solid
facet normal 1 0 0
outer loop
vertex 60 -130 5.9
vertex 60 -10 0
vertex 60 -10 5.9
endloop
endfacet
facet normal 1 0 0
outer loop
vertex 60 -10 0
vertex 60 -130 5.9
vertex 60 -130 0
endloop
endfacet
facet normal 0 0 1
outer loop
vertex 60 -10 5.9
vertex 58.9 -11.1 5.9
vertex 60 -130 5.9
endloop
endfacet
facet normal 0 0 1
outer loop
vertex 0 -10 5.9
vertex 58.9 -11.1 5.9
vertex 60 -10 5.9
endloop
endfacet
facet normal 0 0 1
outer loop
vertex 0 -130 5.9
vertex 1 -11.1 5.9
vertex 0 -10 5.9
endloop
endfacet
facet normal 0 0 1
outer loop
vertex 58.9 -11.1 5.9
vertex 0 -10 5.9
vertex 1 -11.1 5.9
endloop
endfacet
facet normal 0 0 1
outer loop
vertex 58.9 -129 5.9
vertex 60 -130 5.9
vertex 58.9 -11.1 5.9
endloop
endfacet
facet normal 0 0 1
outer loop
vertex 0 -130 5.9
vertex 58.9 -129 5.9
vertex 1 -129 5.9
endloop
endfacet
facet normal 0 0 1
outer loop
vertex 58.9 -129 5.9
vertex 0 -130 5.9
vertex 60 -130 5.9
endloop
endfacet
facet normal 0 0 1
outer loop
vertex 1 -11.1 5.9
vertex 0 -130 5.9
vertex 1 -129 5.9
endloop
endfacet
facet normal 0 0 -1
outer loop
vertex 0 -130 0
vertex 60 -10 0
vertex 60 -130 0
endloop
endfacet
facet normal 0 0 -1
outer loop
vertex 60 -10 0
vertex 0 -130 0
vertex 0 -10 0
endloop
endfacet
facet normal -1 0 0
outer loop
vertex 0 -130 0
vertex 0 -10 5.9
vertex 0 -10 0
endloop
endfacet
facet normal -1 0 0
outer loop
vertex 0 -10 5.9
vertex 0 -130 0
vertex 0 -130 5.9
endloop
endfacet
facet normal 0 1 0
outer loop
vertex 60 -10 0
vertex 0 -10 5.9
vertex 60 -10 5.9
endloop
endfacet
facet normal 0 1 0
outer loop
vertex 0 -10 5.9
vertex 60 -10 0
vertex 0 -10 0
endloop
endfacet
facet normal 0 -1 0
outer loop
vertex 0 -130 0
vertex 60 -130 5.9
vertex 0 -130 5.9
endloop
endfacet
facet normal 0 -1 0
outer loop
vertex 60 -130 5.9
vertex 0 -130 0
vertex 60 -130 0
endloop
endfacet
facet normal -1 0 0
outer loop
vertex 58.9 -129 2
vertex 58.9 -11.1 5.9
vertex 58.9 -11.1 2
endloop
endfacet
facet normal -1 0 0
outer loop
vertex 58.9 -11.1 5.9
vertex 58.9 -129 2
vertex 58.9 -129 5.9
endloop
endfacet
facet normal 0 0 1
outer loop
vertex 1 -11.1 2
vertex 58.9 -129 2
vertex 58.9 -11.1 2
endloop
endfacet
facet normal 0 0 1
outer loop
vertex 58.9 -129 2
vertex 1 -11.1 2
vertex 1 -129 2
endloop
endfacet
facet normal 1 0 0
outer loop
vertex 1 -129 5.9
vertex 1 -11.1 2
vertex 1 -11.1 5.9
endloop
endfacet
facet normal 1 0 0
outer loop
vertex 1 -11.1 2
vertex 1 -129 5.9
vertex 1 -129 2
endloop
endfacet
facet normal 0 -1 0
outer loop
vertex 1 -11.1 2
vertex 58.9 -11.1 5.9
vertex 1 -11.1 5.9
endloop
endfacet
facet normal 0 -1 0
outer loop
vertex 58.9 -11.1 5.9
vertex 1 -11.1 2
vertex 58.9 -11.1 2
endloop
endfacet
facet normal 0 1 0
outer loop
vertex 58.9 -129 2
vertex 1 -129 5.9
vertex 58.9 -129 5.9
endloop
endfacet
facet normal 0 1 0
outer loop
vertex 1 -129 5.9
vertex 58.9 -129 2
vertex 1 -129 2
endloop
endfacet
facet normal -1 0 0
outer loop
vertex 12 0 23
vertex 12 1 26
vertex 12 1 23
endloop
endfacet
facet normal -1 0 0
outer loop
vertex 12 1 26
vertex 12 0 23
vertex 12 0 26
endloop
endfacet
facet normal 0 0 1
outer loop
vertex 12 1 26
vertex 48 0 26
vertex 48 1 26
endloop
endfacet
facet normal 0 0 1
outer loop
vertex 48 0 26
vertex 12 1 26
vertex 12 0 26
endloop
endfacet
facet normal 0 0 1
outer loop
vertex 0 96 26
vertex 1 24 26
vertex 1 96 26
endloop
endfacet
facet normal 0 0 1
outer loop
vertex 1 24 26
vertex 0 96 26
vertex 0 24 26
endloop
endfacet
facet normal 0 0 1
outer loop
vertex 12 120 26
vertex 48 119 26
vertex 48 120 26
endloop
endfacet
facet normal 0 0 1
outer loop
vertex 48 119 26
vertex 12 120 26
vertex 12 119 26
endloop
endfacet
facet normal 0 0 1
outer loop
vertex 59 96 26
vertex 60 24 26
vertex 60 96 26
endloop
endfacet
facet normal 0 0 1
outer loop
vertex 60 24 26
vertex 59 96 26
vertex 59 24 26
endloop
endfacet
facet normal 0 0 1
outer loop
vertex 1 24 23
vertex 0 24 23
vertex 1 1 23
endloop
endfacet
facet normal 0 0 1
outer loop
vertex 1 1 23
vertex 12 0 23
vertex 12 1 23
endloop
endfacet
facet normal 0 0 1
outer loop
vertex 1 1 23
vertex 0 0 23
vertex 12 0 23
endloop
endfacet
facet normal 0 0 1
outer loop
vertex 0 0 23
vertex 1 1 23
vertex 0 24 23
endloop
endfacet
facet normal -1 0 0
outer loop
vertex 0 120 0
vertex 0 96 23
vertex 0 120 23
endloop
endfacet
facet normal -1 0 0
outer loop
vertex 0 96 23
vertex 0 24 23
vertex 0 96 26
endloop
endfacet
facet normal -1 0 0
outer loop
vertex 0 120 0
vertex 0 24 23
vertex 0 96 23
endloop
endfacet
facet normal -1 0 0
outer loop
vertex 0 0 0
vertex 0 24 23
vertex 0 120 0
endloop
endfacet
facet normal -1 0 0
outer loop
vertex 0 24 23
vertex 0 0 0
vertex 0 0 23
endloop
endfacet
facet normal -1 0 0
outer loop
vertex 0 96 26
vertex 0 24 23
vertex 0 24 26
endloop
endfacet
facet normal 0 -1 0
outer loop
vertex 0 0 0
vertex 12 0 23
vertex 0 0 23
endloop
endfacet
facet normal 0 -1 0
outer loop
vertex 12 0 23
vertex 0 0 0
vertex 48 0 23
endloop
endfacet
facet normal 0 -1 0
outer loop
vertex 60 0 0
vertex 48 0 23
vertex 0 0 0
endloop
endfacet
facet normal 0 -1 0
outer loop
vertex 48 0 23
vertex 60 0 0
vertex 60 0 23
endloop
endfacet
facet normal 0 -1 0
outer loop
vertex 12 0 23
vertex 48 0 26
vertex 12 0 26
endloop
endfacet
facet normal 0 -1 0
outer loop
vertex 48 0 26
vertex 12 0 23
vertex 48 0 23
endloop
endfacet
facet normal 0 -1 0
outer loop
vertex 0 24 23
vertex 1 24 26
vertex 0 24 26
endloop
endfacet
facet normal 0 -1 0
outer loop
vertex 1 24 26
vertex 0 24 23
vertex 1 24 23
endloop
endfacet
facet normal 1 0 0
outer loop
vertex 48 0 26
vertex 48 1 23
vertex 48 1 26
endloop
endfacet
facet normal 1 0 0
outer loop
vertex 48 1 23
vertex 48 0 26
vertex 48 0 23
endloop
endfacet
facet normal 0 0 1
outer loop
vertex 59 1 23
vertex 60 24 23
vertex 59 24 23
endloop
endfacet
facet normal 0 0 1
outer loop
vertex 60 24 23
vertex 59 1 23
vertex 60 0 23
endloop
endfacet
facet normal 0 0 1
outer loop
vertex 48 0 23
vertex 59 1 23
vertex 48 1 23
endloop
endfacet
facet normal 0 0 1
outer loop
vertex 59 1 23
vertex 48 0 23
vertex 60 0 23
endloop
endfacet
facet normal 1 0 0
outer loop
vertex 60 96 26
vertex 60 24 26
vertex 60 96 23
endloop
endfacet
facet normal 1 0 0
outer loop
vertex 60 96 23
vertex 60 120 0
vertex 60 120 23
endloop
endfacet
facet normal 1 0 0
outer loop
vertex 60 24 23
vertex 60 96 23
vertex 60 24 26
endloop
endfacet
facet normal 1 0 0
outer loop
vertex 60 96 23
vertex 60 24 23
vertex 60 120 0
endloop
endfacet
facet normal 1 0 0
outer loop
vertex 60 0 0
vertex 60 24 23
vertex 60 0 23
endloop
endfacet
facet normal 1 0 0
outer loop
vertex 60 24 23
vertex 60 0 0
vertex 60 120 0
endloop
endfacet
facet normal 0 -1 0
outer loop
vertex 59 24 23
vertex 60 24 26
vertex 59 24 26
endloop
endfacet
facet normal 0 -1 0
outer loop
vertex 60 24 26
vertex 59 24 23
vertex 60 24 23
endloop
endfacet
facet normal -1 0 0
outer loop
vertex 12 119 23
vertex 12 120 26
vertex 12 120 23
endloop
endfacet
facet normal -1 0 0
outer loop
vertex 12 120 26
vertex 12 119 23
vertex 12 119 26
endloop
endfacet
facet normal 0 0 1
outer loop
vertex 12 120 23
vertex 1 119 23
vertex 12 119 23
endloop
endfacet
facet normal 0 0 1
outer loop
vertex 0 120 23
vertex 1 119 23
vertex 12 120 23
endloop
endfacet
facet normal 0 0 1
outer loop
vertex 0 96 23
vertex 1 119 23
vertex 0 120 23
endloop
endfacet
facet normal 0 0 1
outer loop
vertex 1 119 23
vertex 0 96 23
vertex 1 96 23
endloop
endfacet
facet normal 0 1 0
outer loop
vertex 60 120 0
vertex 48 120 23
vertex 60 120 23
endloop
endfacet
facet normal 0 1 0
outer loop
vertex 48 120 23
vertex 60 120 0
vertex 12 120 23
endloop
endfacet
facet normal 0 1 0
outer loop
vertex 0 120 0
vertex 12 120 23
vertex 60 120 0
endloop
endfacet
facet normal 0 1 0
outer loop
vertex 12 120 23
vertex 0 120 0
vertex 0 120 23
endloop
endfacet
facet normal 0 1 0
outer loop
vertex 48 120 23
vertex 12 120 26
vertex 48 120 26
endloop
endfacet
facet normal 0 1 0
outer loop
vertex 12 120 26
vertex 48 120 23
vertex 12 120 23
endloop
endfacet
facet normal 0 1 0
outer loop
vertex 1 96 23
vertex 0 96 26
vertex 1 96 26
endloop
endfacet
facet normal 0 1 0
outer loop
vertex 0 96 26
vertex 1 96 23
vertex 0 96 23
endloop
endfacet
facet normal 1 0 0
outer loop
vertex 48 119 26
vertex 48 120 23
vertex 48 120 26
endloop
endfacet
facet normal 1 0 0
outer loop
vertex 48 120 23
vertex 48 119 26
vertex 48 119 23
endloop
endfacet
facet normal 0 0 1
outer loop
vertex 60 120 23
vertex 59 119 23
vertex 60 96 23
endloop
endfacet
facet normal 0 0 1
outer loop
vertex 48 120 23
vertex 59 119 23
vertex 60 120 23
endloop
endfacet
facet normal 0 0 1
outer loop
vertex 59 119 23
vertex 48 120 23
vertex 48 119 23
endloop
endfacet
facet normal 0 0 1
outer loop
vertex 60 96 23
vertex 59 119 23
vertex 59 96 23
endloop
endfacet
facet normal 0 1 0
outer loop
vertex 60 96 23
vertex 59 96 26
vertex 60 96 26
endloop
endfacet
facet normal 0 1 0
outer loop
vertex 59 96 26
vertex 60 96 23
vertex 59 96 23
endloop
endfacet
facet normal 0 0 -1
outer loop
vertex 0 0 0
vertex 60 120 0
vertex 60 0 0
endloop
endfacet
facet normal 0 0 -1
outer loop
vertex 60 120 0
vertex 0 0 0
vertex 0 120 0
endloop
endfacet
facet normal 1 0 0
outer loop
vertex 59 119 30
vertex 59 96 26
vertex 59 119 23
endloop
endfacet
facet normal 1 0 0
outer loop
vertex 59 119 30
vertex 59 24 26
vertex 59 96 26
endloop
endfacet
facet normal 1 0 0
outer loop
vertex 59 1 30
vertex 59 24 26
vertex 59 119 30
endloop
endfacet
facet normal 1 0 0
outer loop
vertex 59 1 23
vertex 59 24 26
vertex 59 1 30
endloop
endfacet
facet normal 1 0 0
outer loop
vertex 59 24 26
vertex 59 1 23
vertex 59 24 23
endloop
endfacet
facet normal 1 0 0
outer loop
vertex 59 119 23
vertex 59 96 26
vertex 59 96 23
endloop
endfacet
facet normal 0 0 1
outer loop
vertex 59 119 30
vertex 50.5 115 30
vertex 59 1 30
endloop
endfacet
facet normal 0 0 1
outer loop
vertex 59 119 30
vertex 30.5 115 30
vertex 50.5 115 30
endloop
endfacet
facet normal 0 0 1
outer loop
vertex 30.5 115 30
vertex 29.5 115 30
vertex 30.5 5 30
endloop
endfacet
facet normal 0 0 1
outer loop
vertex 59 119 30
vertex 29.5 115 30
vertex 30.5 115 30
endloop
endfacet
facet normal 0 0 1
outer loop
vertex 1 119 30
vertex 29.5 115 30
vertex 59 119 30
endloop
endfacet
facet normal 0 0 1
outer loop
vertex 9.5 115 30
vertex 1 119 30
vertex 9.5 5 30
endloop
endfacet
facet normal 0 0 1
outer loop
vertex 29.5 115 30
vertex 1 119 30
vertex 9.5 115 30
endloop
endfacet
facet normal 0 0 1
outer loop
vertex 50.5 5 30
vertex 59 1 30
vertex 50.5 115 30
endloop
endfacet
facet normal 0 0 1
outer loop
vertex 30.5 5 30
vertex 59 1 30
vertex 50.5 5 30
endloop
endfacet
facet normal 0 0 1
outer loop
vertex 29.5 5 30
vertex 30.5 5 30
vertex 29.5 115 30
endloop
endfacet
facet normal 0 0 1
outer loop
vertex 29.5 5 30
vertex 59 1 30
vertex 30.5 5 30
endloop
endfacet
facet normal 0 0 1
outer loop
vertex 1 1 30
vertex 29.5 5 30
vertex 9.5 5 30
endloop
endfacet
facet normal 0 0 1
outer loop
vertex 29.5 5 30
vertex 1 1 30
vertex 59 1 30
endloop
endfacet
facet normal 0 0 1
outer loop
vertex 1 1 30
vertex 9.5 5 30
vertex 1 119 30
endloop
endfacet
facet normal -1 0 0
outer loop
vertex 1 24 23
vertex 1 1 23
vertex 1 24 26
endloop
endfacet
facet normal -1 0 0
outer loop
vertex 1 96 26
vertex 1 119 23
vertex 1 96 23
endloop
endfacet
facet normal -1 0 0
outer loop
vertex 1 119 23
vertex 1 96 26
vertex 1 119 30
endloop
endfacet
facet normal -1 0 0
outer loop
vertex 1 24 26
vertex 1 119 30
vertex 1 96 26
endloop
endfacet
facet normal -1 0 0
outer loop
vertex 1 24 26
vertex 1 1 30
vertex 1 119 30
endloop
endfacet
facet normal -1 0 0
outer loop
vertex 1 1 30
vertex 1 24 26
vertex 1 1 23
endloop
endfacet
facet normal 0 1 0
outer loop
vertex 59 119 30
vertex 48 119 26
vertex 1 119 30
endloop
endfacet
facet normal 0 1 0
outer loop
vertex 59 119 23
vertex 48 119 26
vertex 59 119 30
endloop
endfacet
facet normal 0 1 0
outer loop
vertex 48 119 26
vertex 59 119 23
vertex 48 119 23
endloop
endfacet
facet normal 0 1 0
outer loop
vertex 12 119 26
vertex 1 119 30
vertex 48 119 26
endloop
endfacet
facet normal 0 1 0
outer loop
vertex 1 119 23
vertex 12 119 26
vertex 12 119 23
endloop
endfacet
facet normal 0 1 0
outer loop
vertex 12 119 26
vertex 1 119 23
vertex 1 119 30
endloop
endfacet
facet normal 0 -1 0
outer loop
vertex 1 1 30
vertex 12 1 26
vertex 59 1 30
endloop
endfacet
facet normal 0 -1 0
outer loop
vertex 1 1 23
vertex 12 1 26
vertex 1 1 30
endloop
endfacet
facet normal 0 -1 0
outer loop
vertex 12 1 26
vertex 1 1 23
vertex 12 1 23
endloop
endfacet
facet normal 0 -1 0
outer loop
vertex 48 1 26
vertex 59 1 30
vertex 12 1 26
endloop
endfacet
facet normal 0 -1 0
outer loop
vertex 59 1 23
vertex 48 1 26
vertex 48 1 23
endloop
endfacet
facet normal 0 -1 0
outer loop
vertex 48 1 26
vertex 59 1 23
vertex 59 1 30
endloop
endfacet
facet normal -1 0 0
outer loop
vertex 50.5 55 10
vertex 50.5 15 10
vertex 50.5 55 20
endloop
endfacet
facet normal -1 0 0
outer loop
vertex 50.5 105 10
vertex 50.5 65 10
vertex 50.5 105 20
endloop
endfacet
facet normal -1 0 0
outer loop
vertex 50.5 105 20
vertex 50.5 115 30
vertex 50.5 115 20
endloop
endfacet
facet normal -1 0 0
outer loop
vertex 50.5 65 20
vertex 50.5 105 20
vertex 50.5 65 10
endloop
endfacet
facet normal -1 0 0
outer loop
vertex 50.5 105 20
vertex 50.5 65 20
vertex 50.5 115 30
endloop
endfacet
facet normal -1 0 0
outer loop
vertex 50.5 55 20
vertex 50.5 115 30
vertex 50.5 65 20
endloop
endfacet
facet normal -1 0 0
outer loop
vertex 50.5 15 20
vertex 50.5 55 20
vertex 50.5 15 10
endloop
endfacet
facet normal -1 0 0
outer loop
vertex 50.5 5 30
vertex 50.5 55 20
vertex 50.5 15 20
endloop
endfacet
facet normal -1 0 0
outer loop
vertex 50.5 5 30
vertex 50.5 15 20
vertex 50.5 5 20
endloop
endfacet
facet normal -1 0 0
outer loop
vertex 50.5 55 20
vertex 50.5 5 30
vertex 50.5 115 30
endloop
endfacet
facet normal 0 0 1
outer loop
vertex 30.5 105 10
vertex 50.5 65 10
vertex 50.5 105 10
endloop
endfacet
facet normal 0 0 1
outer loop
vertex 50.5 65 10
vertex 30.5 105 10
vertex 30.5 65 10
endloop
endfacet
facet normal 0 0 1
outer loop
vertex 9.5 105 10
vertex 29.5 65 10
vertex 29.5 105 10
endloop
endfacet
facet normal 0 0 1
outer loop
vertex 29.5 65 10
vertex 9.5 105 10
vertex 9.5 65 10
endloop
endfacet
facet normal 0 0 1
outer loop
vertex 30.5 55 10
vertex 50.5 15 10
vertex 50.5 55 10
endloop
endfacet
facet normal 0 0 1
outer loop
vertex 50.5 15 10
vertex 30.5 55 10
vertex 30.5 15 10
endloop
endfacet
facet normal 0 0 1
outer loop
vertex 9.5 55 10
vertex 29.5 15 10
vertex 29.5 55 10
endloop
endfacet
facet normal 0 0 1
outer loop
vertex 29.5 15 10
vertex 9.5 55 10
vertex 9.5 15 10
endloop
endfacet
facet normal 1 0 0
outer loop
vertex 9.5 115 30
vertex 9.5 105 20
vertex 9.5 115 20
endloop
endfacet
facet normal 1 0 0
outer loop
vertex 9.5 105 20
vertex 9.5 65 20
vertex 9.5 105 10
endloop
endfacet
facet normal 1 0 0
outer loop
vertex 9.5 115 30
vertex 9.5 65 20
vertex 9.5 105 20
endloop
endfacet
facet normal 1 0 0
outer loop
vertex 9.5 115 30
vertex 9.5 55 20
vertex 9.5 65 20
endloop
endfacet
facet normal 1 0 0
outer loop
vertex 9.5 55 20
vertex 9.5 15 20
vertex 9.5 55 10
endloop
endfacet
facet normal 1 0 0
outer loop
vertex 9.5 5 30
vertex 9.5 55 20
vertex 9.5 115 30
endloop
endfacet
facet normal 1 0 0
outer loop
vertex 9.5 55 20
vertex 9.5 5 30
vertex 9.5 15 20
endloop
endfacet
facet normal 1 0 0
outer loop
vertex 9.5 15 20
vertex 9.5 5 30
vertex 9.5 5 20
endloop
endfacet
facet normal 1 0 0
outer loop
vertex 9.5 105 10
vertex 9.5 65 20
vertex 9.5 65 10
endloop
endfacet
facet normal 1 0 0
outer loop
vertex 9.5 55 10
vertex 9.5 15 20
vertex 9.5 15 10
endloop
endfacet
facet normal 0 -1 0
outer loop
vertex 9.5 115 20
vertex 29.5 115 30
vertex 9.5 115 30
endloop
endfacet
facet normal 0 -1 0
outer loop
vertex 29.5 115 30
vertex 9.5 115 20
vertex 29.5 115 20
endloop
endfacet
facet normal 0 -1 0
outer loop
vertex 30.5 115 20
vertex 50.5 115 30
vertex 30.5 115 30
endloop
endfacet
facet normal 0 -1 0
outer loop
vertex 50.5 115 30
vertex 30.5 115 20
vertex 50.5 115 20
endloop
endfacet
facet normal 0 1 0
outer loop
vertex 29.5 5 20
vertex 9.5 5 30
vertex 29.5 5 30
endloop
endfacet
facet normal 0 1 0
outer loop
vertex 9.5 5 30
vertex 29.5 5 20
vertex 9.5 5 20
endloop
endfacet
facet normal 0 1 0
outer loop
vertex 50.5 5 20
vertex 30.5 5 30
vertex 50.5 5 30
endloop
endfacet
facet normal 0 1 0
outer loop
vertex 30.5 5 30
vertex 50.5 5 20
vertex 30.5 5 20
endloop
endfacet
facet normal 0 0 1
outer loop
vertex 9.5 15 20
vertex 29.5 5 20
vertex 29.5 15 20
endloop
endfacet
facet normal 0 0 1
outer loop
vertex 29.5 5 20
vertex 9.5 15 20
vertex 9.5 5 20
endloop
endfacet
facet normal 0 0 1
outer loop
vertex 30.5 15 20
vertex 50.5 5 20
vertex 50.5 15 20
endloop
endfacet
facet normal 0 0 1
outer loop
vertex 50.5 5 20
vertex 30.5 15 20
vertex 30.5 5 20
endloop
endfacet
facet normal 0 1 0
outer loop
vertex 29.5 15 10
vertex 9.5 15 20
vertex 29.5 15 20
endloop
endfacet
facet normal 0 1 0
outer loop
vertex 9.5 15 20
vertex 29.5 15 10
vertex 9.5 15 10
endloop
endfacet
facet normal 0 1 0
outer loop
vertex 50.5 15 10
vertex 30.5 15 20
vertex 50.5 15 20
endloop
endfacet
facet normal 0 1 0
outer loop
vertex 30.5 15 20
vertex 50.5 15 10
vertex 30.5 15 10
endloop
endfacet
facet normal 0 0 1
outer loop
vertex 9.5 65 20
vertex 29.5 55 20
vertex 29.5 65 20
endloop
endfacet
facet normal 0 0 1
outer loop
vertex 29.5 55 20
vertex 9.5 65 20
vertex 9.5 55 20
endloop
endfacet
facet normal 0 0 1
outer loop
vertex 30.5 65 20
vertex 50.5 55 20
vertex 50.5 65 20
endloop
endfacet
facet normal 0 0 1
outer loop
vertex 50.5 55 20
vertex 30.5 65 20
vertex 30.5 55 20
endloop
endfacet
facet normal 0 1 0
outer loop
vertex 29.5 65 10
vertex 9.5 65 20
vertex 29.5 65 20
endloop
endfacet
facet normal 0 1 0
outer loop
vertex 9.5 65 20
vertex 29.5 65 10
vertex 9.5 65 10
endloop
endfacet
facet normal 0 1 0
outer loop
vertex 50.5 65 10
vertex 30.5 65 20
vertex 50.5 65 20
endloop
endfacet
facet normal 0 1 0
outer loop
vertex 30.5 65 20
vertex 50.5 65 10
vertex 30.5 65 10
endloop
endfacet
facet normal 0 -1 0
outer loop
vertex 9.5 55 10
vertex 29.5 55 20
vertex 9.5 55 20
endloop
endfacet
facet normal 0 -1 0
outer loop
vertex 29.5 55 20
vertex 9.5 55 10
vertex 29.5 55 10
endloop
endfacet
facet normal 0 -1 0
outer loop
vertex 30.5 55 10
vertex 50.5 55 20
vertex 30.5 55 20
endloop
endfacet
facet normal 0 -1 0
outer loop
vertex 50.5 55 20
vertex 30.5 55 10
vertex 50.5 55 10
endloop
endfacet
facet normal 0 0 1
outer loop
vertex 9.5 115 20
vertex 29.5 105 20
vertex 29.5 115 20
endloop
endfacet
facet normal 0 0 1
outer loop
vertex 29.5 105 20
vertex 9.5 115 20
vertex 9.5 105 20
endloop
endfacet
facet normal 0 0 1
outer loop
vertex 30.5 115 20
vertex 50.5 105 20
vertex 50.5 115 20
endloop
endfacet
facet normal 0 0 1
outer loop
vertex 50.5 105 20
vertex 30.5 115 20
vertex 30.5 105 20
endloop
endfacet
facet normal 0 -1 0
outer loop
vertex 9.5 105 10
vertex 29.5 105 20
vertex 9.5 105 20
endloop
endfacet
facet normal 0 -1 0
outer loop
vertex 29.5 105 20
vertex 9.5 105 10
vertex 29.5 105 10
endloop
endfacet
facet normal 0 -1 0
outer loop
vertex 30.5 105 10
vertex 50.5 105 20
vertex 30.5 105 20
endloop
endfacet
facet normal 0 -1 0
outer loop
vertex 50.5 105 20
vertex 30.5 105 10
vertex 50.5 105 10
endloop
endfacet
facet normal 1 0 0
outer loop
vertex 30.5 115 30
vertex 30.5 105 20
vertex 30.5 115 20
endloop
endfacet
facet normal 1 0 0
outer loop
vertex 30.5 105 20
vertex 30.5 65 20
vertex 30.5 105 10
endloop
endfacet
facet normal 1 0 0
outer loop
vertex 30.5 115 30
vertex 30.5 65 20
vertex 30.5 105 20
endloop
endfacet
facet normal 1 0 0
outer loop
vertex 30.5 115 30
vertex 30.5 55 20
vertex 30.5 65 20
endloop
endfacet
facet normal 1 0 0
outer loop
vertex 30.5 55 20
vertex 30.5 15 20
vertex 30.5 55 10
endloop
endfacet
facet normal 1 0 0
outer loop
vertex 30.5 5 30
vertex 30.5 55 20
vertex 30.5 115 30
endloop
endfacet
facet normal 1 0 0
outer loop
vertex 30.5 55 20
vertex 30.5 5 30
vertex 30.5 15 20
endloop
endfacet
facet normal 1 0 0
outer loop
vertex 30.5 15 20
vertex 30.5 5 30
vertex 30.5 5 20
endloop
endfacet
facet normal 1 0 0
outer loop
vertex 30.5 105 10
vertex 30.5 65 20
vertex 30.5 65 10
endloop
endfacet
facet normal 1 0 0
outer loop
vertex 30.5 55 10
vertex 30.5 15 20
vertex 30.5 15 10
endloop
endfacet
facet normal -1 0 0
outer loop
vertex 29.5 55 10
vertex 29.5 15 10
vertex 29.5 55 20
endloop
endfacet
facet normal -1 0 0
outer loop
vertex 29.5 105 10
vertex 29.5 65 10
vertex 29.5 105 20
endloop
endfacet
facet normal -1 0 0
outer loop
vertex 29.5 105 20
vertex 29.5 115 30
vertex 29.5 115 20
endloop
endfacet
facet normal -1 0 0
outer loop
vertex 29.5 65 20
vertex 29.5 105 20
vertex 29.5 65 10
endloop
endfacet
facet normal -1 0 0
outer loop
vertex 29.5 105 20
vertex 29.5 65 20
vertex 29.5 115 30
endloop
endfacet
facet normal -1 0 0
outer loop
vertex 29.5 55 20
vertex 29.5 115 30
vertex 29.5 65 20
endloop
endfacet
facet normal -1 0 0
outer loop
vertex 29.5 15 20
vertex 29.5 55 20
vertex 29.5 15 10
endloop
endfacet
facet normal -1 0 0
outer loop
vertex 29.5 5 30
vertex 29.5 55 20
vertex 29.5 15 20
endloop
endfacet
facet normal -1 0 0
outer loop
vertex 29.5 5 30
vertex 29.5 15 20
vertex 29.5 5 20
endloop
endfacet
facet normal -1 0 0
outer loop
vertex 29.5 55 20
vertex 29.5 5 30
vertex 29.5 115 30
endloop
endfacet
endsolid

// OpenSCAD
include <boardgame_insert_toolkit_lib.scad>;


// This is a working example of the Boardgame Insert Toolkit used to create a single large box insert
// for the Z-Man game, Pandemic. It is designed for a printer that can print 290mm x 210mm x 28mm.
// See the two box version for an example of a design for smaller printers.
// 
data =
[
    [   "card box",
        [
            [ "box_dimensions",                             [60.0, 120.0, 30.0] ],                       // float f -- default:[ 100, 100, 100]
            [ "enabled",                                    true ],

            [   "components",
                [
                    [   "chit stack",
                        [
                            ["type",                        "chit_stack"],              // "cards" | "chits" | "generic" -- default: "generic"
                            ["compartment_size",            [ 20, 40.0, 20.0] ],      // float f -- default:[ 10, 10, 10]
                            ["num_compartments",            [2, 2] ], 
                        ]
                    ],
                ]
            ]
        ]
    ],
];


// for printing control.
b_print_lid = true;
b_print_box = true;

MakeAll();
